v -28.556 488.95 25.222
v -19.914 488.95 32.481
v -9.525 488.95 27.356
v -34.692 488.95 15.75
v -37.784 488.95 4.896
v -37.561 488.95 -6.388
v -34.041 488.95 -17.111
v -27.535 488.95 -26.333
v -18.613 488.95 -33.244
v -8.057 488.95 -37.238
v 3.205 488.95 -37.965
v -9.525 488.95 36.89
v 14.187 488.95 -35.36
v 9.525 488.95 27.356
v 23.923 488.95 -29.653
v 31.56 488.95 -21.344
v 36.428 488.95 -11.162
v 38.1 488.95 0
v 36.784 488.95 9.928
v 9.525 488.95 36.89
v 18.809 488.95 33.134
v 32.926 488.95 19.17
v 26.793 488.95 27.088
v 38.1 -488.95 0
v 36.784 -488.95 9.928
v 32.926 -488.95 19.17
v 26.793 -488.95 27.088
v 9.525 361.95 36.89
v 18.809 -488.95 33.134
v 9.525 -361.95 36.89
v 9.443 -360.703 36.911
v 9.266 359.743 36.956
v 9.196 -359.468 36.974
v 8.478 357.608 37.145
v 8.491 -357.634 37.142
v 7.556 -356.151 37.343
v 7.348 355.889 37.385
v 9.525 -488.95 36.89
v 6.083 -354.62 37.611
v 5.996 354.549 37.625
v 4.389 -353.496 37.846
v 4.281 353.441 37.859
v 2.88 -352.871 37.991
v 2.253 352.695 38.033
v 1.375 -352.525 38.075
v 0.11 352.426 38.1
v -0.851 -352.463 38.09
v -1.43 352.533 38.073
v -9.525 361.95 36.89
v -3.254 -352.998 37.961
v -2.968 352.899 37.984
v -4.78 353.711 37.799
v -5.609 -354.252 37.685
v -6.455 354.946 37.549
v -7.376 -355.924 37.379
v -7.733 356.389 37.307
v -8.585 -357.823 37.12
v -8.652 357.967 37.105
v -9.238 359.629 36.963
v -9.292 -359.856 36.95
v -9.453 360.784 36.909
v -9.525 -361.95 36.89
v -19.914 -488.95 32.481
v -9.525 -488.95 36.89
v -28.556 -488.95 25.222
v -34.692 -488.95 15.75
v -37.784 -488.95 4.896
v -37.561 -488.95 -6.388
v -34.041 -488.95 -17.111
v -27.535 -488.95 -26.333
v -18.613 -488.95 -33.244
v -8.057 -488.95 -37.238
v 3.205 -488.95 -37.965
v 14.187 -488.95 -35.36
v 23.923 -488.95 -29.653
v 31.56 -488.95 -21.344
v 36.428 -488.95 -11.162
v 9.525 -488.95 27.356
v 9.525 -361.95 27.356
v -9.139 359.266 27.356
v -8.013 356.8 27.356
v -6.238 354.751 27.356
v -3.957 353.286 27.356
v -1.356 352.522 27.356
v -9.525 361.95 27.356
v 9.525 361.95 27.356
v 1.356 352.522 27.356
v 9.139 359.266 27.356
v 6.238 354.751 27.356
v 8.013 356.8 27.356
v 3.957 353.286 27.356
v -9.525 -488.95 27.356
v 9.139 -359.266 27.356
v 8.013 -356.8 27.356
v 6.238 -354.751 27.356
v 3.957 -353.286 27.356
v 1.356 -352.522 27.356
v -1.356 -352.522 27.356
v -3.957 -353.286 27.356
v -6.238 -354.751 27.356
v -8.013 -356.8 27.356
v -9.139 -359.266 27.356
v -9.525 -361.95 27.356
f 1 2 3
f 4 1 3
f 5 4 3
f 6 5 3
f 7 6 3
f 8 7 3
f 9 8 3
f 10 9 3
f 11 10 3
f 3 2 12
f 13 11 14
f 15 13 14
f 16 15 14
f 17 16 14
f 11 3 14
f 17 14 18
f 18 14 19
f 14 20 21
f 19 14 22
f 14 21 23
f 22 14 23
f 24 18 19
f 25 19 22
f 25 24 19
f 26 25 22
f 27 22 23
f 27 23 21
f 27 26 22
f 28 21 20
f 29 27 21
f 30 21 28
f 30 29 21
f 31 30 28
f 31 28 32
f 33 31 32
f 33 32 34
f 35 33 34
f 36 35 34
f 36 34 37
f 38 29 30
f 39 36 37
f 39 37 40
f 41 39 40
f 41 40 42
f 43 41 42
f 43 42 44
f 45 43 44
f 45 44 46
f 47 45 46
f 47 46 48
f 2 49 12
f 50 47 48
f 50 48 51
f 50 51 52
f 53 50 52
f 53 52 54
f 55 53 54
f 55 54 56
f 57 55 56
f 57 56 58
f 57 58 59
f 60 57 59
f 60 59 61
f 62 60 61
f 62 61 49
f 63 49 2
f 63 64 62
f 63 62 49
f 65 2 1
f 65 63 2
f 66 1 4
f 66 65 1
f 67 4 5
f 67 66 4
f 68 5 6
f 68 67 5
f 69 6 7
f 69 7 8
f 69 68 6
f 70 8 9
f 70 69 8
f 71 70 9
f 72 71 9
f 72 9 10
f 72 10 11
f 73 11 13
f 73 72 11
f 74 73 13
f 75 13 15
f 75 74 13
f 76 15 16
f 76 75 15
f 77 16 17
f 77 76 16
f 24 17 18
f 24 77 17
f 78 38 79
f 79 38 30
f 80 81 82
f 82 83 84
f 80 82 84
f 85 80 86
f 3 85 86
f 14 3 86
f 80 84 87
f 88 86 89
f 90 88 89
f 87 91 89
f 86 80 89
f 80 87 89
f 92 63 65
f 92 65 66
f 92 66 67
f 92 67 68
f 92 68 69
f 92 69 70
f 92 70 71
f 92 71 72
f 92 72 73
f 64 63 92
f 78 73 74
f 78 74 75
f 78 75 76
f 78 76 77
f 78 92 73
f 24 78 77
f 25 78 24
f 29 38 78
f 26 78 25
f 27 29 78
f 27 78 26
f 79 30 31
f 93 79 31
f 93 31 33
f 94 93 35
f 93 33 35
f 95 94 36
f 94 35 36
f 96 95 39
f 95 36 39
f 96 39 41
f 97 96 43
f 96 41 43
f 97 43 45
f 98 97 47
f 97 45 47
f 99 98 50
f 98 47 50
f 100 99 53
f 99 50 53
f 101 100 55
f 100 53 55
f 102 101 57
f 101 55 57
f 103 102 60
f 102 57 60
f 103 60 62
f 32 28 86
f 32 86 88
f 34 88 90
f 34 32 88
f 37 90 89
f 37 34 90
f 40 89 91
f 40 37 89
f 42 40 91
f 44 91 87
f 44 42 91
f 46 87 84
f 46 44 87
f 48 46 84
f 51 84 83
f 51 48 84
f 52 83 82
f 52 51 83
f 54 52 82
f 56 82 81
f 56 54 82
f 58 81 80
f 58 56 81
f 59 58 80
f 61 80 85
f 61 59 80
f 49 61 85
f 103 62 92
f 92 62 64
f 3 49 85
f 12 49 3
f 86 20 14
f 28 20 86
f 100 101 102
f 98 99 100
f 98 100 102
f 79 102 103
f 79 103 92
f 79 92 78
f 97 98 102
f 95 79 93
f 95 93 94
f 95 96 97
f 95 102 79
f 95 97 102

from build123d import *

# Parameters (mm, degrees)
F0_R     = 38.1
F1_DEPTH = 488.95
F4_DEPTH = 10.7442


# Not quite as in the source:
# - a pattern or mirror of a feature is missing from the dataset's text; its kind, count and spacing are read off the source's solid


with BuildPart() as f1:
    # F0 (on Front) → F1 (new body, symmetric)
    with BuildSketch(Plane.XZ):
        Circle(F0_R)
    extrude(amount=F1_DEPTH, both=True)

    # F3 (on offset) → F4 (cut)
    with BuildSketch(Plane.XY.offset(38.1)):
        with BuildLine():
            Line((-9.525, -361.95), (-9.525, -574.1807818413))
            Line((-9.525, -574.1807818413), (9.525, -574.1807818413))
            Line((9.525, -574.1807818413), (9.525, -361.95))
            ThreePointArc((9.525, -361.95), (0, -352.425), (-9.525, -361.95))
        make_face()
    f4 = extrude(amount=-F4_DEPTH, mode=Mode.SUBTRACT)

    # F4_copies: F4 across plane
    add(f4.mirror(Plane.ZX), mode=Mode.SUBTRACT)


solid = f1.part
